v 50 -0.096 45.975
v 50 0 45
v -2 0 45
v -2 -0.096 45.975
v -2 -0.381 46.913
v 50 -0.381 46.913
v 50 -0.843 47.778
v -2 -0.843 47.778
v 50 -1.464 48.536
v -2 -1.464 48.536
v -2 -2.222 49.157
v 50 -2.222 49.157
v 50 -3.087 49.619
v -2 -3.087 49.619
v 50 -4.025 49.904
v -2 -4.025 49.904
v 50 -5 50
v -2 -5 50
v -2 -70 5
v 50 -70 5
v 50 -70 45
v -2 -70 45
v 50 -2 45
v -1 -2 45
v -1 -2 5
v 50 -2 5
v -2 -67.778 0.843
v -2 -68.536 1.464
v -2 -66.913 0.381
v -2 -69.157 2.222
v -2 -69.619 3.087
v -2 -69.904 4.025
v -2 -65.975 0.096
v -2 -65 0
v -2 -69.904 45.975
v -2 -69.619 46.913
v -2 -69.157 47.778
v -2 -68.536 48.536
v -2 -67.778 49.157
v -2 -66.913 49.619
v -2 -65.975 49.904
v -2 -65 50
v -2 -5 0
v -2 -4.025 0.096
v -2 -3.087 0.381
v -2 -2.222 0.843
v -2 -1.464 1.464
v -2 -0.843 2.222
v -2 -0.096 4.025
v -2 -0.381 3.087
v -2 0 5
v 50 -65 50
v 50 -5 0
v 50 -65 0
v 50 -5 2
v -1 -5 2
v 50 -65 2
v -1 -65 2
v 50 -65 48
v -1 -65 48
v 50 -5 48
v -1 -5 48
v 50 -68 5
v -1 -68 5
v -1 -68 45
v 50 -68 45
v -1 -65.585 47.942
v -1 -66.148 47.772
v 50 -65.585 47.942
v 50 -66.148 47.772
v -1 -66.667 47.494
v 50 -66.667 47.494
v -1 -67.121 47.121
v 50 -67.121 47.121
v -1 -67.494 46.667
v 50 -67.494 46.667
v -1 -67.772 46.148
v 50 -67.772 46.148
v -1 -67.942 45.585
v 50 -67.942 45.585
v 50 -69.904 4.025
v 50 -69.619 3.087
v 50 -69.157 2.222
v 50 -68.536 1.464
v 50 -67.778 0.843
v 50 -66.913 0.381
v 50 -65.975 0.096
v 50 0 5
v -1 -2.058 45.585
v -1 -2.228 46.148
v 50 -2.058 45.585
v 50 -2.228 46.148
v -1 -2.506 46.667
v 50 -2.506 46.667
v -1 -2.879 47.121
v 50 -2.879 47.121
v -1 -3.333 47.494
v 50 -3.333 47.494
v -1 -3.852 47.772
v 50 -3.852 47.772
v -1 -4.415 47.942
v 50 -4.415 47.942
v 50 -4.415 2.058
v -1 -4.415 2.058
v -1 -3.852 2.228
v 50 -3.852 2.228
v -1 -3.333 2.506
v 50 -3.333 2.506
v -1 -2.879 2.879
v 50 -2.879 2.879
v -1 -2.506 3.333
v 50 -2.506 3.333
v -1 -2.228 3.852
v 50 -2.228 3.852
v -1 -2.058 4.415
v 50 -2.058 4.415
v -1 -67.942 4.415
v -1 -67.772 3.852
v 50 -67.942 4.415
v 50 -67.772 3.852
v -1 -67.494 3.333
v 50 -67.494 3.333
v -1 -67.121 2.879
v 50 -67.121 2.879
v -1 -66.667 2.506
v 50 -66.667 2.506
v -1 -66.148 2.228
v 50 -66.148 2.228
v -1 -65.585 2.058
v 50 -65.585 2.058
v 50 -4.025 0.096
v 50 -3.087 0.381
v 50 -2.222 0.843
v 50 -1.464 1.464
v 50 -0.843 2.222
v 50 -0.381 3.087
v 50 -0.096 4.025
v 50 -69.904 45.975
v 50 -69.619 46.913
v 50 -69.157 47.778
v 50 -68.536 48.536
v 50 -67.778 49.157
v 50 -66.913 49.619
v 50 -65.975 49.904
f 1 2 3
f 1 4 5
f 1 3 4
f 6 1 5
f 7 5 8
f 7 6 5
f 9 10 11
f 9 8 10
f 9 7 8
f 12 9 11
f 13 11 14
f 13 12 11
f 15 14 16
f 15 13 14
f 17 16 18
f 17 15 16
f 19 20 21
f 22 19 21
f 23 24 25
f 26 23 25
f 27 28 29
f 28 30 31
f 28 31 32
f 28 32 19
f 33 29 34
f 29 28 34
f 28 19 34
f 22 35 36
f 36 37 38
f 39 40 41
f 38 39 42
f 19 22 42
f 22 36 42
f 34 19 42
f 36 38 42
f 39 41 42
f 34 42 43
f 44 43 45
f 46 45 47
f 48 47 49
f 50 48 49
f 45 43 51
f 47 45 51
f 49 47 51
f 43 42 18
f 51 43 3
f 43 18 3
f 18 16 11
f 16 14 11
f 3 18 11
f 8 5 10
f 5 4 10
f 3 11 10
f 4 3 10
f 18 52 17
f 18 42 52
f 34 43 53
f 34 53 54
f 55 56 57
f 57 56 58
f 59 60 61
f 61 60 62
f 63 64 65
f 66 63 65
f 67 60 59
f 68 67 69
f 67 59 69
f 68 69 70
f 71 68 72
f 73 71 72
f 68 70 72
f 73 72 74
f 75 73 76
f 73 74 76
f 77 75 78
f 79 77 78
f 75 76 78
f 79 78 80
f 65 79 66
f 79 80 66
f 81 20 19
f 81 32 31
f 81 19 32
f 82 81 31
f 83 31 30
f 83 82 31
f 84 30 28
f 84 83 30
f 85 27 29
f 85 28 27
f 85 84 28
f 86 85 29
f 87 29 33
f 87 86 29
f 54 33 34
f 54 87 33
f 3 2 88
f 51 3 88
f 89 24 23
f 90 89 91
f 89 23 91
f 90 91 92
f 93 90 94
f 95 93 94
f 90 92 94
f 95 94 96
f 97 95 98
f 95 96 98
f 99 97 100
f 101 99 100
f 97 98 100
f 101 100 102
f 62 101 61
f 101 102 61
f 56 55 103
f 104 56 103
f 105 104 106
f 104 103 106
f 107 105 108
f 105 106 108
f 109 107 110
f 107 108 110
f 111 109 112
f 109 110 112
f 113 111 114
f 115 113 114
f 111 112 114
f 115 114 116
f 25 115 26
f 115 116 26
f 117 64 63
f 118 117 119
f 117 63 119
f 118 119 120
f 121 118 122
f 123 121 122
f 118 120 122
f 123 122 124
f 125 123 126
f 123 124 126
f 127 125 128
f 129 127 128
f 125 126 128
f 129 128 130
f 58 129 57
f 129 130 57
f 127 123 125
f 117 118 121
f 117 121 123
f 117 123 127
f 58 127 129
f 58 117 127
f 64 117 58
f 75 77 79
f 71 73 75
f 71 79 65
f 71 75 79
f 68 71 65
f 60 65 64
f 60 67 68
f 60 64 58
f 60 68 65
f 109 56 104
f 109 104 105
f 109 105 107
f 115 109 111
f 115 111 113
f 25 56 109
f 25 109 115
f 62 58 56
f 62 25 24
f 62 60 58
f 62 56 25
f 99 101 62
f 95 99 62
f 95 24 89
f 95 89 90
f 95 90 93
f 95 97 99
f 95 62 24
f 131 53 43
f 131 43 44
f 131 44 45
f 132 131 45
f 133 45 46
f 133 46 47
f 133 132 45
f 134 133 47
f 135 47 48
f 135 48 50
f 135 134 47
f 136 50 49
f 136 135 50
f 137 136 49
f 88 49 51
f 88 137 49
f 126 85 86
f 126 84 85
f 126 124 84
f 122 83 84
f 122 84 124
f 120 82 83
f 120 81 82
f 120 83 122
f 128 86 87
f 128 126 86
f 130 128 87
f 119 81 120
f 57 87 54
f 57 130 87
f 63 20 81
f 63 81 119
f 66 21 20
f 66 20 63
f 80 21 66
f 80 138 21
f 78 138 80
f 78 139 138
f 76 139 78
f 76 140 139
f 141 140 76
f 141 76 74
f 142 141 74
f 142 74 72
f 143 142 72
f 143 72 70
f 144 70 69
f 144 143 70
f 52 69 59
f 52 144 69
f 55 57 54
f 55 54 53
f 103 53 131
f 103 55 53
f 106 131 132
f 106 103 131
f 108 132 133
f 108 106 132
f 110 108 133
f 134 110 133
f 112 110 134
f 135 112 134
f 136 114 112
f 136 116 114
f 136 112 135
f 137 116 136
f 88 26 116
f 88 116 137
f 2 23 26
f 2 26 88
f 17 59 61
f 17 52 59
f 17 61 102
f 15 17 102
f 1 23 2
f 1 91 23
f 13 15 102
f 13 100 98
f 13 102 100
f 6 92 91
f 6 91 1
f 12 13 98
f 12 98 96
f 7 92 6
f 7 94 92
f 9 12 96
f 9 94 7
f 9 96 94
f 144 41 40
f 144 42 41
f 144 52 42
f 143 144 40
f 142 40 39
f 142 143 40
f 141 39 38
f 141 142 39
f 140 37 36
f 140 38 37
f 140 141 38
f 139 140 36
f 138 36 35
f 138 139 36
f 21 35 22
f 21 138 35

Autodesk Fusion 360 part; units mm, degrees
sketch "Sketch1" plane through (0, 0, 0) normal (1, 0, 0) x (0, 1, 0)
  line L0 (0, 0) -> (-70, 0)
  line L1 (-70, 0) -> (-70, 50)
  line L2 (-70, 50) -> (0, 50)
  line L3 (0, 50) -> (0, 0)
  dimension "d1" = 70
  dimension "d2" = 50
extrude "Extrude1" add sketch "Sketch1" along normal blind 50
fillet "Fillet1" radius 5 4 edges at (25, 0, 50) (25, 0, 0) (25, -70, 0) (25, -70, 50)
shell "Shell1" thickness 2 removed faces 1 at (50, -45, 16.6667)
extrude "Extrude3" add 1 faces at (0, -45, 16.6667) along direction (-1, 0, 0) blind 2
extrude "Extrude4" cut 1 faces at (2, -25, 17.3333) along direction (-1, 0, 0) blind 3
